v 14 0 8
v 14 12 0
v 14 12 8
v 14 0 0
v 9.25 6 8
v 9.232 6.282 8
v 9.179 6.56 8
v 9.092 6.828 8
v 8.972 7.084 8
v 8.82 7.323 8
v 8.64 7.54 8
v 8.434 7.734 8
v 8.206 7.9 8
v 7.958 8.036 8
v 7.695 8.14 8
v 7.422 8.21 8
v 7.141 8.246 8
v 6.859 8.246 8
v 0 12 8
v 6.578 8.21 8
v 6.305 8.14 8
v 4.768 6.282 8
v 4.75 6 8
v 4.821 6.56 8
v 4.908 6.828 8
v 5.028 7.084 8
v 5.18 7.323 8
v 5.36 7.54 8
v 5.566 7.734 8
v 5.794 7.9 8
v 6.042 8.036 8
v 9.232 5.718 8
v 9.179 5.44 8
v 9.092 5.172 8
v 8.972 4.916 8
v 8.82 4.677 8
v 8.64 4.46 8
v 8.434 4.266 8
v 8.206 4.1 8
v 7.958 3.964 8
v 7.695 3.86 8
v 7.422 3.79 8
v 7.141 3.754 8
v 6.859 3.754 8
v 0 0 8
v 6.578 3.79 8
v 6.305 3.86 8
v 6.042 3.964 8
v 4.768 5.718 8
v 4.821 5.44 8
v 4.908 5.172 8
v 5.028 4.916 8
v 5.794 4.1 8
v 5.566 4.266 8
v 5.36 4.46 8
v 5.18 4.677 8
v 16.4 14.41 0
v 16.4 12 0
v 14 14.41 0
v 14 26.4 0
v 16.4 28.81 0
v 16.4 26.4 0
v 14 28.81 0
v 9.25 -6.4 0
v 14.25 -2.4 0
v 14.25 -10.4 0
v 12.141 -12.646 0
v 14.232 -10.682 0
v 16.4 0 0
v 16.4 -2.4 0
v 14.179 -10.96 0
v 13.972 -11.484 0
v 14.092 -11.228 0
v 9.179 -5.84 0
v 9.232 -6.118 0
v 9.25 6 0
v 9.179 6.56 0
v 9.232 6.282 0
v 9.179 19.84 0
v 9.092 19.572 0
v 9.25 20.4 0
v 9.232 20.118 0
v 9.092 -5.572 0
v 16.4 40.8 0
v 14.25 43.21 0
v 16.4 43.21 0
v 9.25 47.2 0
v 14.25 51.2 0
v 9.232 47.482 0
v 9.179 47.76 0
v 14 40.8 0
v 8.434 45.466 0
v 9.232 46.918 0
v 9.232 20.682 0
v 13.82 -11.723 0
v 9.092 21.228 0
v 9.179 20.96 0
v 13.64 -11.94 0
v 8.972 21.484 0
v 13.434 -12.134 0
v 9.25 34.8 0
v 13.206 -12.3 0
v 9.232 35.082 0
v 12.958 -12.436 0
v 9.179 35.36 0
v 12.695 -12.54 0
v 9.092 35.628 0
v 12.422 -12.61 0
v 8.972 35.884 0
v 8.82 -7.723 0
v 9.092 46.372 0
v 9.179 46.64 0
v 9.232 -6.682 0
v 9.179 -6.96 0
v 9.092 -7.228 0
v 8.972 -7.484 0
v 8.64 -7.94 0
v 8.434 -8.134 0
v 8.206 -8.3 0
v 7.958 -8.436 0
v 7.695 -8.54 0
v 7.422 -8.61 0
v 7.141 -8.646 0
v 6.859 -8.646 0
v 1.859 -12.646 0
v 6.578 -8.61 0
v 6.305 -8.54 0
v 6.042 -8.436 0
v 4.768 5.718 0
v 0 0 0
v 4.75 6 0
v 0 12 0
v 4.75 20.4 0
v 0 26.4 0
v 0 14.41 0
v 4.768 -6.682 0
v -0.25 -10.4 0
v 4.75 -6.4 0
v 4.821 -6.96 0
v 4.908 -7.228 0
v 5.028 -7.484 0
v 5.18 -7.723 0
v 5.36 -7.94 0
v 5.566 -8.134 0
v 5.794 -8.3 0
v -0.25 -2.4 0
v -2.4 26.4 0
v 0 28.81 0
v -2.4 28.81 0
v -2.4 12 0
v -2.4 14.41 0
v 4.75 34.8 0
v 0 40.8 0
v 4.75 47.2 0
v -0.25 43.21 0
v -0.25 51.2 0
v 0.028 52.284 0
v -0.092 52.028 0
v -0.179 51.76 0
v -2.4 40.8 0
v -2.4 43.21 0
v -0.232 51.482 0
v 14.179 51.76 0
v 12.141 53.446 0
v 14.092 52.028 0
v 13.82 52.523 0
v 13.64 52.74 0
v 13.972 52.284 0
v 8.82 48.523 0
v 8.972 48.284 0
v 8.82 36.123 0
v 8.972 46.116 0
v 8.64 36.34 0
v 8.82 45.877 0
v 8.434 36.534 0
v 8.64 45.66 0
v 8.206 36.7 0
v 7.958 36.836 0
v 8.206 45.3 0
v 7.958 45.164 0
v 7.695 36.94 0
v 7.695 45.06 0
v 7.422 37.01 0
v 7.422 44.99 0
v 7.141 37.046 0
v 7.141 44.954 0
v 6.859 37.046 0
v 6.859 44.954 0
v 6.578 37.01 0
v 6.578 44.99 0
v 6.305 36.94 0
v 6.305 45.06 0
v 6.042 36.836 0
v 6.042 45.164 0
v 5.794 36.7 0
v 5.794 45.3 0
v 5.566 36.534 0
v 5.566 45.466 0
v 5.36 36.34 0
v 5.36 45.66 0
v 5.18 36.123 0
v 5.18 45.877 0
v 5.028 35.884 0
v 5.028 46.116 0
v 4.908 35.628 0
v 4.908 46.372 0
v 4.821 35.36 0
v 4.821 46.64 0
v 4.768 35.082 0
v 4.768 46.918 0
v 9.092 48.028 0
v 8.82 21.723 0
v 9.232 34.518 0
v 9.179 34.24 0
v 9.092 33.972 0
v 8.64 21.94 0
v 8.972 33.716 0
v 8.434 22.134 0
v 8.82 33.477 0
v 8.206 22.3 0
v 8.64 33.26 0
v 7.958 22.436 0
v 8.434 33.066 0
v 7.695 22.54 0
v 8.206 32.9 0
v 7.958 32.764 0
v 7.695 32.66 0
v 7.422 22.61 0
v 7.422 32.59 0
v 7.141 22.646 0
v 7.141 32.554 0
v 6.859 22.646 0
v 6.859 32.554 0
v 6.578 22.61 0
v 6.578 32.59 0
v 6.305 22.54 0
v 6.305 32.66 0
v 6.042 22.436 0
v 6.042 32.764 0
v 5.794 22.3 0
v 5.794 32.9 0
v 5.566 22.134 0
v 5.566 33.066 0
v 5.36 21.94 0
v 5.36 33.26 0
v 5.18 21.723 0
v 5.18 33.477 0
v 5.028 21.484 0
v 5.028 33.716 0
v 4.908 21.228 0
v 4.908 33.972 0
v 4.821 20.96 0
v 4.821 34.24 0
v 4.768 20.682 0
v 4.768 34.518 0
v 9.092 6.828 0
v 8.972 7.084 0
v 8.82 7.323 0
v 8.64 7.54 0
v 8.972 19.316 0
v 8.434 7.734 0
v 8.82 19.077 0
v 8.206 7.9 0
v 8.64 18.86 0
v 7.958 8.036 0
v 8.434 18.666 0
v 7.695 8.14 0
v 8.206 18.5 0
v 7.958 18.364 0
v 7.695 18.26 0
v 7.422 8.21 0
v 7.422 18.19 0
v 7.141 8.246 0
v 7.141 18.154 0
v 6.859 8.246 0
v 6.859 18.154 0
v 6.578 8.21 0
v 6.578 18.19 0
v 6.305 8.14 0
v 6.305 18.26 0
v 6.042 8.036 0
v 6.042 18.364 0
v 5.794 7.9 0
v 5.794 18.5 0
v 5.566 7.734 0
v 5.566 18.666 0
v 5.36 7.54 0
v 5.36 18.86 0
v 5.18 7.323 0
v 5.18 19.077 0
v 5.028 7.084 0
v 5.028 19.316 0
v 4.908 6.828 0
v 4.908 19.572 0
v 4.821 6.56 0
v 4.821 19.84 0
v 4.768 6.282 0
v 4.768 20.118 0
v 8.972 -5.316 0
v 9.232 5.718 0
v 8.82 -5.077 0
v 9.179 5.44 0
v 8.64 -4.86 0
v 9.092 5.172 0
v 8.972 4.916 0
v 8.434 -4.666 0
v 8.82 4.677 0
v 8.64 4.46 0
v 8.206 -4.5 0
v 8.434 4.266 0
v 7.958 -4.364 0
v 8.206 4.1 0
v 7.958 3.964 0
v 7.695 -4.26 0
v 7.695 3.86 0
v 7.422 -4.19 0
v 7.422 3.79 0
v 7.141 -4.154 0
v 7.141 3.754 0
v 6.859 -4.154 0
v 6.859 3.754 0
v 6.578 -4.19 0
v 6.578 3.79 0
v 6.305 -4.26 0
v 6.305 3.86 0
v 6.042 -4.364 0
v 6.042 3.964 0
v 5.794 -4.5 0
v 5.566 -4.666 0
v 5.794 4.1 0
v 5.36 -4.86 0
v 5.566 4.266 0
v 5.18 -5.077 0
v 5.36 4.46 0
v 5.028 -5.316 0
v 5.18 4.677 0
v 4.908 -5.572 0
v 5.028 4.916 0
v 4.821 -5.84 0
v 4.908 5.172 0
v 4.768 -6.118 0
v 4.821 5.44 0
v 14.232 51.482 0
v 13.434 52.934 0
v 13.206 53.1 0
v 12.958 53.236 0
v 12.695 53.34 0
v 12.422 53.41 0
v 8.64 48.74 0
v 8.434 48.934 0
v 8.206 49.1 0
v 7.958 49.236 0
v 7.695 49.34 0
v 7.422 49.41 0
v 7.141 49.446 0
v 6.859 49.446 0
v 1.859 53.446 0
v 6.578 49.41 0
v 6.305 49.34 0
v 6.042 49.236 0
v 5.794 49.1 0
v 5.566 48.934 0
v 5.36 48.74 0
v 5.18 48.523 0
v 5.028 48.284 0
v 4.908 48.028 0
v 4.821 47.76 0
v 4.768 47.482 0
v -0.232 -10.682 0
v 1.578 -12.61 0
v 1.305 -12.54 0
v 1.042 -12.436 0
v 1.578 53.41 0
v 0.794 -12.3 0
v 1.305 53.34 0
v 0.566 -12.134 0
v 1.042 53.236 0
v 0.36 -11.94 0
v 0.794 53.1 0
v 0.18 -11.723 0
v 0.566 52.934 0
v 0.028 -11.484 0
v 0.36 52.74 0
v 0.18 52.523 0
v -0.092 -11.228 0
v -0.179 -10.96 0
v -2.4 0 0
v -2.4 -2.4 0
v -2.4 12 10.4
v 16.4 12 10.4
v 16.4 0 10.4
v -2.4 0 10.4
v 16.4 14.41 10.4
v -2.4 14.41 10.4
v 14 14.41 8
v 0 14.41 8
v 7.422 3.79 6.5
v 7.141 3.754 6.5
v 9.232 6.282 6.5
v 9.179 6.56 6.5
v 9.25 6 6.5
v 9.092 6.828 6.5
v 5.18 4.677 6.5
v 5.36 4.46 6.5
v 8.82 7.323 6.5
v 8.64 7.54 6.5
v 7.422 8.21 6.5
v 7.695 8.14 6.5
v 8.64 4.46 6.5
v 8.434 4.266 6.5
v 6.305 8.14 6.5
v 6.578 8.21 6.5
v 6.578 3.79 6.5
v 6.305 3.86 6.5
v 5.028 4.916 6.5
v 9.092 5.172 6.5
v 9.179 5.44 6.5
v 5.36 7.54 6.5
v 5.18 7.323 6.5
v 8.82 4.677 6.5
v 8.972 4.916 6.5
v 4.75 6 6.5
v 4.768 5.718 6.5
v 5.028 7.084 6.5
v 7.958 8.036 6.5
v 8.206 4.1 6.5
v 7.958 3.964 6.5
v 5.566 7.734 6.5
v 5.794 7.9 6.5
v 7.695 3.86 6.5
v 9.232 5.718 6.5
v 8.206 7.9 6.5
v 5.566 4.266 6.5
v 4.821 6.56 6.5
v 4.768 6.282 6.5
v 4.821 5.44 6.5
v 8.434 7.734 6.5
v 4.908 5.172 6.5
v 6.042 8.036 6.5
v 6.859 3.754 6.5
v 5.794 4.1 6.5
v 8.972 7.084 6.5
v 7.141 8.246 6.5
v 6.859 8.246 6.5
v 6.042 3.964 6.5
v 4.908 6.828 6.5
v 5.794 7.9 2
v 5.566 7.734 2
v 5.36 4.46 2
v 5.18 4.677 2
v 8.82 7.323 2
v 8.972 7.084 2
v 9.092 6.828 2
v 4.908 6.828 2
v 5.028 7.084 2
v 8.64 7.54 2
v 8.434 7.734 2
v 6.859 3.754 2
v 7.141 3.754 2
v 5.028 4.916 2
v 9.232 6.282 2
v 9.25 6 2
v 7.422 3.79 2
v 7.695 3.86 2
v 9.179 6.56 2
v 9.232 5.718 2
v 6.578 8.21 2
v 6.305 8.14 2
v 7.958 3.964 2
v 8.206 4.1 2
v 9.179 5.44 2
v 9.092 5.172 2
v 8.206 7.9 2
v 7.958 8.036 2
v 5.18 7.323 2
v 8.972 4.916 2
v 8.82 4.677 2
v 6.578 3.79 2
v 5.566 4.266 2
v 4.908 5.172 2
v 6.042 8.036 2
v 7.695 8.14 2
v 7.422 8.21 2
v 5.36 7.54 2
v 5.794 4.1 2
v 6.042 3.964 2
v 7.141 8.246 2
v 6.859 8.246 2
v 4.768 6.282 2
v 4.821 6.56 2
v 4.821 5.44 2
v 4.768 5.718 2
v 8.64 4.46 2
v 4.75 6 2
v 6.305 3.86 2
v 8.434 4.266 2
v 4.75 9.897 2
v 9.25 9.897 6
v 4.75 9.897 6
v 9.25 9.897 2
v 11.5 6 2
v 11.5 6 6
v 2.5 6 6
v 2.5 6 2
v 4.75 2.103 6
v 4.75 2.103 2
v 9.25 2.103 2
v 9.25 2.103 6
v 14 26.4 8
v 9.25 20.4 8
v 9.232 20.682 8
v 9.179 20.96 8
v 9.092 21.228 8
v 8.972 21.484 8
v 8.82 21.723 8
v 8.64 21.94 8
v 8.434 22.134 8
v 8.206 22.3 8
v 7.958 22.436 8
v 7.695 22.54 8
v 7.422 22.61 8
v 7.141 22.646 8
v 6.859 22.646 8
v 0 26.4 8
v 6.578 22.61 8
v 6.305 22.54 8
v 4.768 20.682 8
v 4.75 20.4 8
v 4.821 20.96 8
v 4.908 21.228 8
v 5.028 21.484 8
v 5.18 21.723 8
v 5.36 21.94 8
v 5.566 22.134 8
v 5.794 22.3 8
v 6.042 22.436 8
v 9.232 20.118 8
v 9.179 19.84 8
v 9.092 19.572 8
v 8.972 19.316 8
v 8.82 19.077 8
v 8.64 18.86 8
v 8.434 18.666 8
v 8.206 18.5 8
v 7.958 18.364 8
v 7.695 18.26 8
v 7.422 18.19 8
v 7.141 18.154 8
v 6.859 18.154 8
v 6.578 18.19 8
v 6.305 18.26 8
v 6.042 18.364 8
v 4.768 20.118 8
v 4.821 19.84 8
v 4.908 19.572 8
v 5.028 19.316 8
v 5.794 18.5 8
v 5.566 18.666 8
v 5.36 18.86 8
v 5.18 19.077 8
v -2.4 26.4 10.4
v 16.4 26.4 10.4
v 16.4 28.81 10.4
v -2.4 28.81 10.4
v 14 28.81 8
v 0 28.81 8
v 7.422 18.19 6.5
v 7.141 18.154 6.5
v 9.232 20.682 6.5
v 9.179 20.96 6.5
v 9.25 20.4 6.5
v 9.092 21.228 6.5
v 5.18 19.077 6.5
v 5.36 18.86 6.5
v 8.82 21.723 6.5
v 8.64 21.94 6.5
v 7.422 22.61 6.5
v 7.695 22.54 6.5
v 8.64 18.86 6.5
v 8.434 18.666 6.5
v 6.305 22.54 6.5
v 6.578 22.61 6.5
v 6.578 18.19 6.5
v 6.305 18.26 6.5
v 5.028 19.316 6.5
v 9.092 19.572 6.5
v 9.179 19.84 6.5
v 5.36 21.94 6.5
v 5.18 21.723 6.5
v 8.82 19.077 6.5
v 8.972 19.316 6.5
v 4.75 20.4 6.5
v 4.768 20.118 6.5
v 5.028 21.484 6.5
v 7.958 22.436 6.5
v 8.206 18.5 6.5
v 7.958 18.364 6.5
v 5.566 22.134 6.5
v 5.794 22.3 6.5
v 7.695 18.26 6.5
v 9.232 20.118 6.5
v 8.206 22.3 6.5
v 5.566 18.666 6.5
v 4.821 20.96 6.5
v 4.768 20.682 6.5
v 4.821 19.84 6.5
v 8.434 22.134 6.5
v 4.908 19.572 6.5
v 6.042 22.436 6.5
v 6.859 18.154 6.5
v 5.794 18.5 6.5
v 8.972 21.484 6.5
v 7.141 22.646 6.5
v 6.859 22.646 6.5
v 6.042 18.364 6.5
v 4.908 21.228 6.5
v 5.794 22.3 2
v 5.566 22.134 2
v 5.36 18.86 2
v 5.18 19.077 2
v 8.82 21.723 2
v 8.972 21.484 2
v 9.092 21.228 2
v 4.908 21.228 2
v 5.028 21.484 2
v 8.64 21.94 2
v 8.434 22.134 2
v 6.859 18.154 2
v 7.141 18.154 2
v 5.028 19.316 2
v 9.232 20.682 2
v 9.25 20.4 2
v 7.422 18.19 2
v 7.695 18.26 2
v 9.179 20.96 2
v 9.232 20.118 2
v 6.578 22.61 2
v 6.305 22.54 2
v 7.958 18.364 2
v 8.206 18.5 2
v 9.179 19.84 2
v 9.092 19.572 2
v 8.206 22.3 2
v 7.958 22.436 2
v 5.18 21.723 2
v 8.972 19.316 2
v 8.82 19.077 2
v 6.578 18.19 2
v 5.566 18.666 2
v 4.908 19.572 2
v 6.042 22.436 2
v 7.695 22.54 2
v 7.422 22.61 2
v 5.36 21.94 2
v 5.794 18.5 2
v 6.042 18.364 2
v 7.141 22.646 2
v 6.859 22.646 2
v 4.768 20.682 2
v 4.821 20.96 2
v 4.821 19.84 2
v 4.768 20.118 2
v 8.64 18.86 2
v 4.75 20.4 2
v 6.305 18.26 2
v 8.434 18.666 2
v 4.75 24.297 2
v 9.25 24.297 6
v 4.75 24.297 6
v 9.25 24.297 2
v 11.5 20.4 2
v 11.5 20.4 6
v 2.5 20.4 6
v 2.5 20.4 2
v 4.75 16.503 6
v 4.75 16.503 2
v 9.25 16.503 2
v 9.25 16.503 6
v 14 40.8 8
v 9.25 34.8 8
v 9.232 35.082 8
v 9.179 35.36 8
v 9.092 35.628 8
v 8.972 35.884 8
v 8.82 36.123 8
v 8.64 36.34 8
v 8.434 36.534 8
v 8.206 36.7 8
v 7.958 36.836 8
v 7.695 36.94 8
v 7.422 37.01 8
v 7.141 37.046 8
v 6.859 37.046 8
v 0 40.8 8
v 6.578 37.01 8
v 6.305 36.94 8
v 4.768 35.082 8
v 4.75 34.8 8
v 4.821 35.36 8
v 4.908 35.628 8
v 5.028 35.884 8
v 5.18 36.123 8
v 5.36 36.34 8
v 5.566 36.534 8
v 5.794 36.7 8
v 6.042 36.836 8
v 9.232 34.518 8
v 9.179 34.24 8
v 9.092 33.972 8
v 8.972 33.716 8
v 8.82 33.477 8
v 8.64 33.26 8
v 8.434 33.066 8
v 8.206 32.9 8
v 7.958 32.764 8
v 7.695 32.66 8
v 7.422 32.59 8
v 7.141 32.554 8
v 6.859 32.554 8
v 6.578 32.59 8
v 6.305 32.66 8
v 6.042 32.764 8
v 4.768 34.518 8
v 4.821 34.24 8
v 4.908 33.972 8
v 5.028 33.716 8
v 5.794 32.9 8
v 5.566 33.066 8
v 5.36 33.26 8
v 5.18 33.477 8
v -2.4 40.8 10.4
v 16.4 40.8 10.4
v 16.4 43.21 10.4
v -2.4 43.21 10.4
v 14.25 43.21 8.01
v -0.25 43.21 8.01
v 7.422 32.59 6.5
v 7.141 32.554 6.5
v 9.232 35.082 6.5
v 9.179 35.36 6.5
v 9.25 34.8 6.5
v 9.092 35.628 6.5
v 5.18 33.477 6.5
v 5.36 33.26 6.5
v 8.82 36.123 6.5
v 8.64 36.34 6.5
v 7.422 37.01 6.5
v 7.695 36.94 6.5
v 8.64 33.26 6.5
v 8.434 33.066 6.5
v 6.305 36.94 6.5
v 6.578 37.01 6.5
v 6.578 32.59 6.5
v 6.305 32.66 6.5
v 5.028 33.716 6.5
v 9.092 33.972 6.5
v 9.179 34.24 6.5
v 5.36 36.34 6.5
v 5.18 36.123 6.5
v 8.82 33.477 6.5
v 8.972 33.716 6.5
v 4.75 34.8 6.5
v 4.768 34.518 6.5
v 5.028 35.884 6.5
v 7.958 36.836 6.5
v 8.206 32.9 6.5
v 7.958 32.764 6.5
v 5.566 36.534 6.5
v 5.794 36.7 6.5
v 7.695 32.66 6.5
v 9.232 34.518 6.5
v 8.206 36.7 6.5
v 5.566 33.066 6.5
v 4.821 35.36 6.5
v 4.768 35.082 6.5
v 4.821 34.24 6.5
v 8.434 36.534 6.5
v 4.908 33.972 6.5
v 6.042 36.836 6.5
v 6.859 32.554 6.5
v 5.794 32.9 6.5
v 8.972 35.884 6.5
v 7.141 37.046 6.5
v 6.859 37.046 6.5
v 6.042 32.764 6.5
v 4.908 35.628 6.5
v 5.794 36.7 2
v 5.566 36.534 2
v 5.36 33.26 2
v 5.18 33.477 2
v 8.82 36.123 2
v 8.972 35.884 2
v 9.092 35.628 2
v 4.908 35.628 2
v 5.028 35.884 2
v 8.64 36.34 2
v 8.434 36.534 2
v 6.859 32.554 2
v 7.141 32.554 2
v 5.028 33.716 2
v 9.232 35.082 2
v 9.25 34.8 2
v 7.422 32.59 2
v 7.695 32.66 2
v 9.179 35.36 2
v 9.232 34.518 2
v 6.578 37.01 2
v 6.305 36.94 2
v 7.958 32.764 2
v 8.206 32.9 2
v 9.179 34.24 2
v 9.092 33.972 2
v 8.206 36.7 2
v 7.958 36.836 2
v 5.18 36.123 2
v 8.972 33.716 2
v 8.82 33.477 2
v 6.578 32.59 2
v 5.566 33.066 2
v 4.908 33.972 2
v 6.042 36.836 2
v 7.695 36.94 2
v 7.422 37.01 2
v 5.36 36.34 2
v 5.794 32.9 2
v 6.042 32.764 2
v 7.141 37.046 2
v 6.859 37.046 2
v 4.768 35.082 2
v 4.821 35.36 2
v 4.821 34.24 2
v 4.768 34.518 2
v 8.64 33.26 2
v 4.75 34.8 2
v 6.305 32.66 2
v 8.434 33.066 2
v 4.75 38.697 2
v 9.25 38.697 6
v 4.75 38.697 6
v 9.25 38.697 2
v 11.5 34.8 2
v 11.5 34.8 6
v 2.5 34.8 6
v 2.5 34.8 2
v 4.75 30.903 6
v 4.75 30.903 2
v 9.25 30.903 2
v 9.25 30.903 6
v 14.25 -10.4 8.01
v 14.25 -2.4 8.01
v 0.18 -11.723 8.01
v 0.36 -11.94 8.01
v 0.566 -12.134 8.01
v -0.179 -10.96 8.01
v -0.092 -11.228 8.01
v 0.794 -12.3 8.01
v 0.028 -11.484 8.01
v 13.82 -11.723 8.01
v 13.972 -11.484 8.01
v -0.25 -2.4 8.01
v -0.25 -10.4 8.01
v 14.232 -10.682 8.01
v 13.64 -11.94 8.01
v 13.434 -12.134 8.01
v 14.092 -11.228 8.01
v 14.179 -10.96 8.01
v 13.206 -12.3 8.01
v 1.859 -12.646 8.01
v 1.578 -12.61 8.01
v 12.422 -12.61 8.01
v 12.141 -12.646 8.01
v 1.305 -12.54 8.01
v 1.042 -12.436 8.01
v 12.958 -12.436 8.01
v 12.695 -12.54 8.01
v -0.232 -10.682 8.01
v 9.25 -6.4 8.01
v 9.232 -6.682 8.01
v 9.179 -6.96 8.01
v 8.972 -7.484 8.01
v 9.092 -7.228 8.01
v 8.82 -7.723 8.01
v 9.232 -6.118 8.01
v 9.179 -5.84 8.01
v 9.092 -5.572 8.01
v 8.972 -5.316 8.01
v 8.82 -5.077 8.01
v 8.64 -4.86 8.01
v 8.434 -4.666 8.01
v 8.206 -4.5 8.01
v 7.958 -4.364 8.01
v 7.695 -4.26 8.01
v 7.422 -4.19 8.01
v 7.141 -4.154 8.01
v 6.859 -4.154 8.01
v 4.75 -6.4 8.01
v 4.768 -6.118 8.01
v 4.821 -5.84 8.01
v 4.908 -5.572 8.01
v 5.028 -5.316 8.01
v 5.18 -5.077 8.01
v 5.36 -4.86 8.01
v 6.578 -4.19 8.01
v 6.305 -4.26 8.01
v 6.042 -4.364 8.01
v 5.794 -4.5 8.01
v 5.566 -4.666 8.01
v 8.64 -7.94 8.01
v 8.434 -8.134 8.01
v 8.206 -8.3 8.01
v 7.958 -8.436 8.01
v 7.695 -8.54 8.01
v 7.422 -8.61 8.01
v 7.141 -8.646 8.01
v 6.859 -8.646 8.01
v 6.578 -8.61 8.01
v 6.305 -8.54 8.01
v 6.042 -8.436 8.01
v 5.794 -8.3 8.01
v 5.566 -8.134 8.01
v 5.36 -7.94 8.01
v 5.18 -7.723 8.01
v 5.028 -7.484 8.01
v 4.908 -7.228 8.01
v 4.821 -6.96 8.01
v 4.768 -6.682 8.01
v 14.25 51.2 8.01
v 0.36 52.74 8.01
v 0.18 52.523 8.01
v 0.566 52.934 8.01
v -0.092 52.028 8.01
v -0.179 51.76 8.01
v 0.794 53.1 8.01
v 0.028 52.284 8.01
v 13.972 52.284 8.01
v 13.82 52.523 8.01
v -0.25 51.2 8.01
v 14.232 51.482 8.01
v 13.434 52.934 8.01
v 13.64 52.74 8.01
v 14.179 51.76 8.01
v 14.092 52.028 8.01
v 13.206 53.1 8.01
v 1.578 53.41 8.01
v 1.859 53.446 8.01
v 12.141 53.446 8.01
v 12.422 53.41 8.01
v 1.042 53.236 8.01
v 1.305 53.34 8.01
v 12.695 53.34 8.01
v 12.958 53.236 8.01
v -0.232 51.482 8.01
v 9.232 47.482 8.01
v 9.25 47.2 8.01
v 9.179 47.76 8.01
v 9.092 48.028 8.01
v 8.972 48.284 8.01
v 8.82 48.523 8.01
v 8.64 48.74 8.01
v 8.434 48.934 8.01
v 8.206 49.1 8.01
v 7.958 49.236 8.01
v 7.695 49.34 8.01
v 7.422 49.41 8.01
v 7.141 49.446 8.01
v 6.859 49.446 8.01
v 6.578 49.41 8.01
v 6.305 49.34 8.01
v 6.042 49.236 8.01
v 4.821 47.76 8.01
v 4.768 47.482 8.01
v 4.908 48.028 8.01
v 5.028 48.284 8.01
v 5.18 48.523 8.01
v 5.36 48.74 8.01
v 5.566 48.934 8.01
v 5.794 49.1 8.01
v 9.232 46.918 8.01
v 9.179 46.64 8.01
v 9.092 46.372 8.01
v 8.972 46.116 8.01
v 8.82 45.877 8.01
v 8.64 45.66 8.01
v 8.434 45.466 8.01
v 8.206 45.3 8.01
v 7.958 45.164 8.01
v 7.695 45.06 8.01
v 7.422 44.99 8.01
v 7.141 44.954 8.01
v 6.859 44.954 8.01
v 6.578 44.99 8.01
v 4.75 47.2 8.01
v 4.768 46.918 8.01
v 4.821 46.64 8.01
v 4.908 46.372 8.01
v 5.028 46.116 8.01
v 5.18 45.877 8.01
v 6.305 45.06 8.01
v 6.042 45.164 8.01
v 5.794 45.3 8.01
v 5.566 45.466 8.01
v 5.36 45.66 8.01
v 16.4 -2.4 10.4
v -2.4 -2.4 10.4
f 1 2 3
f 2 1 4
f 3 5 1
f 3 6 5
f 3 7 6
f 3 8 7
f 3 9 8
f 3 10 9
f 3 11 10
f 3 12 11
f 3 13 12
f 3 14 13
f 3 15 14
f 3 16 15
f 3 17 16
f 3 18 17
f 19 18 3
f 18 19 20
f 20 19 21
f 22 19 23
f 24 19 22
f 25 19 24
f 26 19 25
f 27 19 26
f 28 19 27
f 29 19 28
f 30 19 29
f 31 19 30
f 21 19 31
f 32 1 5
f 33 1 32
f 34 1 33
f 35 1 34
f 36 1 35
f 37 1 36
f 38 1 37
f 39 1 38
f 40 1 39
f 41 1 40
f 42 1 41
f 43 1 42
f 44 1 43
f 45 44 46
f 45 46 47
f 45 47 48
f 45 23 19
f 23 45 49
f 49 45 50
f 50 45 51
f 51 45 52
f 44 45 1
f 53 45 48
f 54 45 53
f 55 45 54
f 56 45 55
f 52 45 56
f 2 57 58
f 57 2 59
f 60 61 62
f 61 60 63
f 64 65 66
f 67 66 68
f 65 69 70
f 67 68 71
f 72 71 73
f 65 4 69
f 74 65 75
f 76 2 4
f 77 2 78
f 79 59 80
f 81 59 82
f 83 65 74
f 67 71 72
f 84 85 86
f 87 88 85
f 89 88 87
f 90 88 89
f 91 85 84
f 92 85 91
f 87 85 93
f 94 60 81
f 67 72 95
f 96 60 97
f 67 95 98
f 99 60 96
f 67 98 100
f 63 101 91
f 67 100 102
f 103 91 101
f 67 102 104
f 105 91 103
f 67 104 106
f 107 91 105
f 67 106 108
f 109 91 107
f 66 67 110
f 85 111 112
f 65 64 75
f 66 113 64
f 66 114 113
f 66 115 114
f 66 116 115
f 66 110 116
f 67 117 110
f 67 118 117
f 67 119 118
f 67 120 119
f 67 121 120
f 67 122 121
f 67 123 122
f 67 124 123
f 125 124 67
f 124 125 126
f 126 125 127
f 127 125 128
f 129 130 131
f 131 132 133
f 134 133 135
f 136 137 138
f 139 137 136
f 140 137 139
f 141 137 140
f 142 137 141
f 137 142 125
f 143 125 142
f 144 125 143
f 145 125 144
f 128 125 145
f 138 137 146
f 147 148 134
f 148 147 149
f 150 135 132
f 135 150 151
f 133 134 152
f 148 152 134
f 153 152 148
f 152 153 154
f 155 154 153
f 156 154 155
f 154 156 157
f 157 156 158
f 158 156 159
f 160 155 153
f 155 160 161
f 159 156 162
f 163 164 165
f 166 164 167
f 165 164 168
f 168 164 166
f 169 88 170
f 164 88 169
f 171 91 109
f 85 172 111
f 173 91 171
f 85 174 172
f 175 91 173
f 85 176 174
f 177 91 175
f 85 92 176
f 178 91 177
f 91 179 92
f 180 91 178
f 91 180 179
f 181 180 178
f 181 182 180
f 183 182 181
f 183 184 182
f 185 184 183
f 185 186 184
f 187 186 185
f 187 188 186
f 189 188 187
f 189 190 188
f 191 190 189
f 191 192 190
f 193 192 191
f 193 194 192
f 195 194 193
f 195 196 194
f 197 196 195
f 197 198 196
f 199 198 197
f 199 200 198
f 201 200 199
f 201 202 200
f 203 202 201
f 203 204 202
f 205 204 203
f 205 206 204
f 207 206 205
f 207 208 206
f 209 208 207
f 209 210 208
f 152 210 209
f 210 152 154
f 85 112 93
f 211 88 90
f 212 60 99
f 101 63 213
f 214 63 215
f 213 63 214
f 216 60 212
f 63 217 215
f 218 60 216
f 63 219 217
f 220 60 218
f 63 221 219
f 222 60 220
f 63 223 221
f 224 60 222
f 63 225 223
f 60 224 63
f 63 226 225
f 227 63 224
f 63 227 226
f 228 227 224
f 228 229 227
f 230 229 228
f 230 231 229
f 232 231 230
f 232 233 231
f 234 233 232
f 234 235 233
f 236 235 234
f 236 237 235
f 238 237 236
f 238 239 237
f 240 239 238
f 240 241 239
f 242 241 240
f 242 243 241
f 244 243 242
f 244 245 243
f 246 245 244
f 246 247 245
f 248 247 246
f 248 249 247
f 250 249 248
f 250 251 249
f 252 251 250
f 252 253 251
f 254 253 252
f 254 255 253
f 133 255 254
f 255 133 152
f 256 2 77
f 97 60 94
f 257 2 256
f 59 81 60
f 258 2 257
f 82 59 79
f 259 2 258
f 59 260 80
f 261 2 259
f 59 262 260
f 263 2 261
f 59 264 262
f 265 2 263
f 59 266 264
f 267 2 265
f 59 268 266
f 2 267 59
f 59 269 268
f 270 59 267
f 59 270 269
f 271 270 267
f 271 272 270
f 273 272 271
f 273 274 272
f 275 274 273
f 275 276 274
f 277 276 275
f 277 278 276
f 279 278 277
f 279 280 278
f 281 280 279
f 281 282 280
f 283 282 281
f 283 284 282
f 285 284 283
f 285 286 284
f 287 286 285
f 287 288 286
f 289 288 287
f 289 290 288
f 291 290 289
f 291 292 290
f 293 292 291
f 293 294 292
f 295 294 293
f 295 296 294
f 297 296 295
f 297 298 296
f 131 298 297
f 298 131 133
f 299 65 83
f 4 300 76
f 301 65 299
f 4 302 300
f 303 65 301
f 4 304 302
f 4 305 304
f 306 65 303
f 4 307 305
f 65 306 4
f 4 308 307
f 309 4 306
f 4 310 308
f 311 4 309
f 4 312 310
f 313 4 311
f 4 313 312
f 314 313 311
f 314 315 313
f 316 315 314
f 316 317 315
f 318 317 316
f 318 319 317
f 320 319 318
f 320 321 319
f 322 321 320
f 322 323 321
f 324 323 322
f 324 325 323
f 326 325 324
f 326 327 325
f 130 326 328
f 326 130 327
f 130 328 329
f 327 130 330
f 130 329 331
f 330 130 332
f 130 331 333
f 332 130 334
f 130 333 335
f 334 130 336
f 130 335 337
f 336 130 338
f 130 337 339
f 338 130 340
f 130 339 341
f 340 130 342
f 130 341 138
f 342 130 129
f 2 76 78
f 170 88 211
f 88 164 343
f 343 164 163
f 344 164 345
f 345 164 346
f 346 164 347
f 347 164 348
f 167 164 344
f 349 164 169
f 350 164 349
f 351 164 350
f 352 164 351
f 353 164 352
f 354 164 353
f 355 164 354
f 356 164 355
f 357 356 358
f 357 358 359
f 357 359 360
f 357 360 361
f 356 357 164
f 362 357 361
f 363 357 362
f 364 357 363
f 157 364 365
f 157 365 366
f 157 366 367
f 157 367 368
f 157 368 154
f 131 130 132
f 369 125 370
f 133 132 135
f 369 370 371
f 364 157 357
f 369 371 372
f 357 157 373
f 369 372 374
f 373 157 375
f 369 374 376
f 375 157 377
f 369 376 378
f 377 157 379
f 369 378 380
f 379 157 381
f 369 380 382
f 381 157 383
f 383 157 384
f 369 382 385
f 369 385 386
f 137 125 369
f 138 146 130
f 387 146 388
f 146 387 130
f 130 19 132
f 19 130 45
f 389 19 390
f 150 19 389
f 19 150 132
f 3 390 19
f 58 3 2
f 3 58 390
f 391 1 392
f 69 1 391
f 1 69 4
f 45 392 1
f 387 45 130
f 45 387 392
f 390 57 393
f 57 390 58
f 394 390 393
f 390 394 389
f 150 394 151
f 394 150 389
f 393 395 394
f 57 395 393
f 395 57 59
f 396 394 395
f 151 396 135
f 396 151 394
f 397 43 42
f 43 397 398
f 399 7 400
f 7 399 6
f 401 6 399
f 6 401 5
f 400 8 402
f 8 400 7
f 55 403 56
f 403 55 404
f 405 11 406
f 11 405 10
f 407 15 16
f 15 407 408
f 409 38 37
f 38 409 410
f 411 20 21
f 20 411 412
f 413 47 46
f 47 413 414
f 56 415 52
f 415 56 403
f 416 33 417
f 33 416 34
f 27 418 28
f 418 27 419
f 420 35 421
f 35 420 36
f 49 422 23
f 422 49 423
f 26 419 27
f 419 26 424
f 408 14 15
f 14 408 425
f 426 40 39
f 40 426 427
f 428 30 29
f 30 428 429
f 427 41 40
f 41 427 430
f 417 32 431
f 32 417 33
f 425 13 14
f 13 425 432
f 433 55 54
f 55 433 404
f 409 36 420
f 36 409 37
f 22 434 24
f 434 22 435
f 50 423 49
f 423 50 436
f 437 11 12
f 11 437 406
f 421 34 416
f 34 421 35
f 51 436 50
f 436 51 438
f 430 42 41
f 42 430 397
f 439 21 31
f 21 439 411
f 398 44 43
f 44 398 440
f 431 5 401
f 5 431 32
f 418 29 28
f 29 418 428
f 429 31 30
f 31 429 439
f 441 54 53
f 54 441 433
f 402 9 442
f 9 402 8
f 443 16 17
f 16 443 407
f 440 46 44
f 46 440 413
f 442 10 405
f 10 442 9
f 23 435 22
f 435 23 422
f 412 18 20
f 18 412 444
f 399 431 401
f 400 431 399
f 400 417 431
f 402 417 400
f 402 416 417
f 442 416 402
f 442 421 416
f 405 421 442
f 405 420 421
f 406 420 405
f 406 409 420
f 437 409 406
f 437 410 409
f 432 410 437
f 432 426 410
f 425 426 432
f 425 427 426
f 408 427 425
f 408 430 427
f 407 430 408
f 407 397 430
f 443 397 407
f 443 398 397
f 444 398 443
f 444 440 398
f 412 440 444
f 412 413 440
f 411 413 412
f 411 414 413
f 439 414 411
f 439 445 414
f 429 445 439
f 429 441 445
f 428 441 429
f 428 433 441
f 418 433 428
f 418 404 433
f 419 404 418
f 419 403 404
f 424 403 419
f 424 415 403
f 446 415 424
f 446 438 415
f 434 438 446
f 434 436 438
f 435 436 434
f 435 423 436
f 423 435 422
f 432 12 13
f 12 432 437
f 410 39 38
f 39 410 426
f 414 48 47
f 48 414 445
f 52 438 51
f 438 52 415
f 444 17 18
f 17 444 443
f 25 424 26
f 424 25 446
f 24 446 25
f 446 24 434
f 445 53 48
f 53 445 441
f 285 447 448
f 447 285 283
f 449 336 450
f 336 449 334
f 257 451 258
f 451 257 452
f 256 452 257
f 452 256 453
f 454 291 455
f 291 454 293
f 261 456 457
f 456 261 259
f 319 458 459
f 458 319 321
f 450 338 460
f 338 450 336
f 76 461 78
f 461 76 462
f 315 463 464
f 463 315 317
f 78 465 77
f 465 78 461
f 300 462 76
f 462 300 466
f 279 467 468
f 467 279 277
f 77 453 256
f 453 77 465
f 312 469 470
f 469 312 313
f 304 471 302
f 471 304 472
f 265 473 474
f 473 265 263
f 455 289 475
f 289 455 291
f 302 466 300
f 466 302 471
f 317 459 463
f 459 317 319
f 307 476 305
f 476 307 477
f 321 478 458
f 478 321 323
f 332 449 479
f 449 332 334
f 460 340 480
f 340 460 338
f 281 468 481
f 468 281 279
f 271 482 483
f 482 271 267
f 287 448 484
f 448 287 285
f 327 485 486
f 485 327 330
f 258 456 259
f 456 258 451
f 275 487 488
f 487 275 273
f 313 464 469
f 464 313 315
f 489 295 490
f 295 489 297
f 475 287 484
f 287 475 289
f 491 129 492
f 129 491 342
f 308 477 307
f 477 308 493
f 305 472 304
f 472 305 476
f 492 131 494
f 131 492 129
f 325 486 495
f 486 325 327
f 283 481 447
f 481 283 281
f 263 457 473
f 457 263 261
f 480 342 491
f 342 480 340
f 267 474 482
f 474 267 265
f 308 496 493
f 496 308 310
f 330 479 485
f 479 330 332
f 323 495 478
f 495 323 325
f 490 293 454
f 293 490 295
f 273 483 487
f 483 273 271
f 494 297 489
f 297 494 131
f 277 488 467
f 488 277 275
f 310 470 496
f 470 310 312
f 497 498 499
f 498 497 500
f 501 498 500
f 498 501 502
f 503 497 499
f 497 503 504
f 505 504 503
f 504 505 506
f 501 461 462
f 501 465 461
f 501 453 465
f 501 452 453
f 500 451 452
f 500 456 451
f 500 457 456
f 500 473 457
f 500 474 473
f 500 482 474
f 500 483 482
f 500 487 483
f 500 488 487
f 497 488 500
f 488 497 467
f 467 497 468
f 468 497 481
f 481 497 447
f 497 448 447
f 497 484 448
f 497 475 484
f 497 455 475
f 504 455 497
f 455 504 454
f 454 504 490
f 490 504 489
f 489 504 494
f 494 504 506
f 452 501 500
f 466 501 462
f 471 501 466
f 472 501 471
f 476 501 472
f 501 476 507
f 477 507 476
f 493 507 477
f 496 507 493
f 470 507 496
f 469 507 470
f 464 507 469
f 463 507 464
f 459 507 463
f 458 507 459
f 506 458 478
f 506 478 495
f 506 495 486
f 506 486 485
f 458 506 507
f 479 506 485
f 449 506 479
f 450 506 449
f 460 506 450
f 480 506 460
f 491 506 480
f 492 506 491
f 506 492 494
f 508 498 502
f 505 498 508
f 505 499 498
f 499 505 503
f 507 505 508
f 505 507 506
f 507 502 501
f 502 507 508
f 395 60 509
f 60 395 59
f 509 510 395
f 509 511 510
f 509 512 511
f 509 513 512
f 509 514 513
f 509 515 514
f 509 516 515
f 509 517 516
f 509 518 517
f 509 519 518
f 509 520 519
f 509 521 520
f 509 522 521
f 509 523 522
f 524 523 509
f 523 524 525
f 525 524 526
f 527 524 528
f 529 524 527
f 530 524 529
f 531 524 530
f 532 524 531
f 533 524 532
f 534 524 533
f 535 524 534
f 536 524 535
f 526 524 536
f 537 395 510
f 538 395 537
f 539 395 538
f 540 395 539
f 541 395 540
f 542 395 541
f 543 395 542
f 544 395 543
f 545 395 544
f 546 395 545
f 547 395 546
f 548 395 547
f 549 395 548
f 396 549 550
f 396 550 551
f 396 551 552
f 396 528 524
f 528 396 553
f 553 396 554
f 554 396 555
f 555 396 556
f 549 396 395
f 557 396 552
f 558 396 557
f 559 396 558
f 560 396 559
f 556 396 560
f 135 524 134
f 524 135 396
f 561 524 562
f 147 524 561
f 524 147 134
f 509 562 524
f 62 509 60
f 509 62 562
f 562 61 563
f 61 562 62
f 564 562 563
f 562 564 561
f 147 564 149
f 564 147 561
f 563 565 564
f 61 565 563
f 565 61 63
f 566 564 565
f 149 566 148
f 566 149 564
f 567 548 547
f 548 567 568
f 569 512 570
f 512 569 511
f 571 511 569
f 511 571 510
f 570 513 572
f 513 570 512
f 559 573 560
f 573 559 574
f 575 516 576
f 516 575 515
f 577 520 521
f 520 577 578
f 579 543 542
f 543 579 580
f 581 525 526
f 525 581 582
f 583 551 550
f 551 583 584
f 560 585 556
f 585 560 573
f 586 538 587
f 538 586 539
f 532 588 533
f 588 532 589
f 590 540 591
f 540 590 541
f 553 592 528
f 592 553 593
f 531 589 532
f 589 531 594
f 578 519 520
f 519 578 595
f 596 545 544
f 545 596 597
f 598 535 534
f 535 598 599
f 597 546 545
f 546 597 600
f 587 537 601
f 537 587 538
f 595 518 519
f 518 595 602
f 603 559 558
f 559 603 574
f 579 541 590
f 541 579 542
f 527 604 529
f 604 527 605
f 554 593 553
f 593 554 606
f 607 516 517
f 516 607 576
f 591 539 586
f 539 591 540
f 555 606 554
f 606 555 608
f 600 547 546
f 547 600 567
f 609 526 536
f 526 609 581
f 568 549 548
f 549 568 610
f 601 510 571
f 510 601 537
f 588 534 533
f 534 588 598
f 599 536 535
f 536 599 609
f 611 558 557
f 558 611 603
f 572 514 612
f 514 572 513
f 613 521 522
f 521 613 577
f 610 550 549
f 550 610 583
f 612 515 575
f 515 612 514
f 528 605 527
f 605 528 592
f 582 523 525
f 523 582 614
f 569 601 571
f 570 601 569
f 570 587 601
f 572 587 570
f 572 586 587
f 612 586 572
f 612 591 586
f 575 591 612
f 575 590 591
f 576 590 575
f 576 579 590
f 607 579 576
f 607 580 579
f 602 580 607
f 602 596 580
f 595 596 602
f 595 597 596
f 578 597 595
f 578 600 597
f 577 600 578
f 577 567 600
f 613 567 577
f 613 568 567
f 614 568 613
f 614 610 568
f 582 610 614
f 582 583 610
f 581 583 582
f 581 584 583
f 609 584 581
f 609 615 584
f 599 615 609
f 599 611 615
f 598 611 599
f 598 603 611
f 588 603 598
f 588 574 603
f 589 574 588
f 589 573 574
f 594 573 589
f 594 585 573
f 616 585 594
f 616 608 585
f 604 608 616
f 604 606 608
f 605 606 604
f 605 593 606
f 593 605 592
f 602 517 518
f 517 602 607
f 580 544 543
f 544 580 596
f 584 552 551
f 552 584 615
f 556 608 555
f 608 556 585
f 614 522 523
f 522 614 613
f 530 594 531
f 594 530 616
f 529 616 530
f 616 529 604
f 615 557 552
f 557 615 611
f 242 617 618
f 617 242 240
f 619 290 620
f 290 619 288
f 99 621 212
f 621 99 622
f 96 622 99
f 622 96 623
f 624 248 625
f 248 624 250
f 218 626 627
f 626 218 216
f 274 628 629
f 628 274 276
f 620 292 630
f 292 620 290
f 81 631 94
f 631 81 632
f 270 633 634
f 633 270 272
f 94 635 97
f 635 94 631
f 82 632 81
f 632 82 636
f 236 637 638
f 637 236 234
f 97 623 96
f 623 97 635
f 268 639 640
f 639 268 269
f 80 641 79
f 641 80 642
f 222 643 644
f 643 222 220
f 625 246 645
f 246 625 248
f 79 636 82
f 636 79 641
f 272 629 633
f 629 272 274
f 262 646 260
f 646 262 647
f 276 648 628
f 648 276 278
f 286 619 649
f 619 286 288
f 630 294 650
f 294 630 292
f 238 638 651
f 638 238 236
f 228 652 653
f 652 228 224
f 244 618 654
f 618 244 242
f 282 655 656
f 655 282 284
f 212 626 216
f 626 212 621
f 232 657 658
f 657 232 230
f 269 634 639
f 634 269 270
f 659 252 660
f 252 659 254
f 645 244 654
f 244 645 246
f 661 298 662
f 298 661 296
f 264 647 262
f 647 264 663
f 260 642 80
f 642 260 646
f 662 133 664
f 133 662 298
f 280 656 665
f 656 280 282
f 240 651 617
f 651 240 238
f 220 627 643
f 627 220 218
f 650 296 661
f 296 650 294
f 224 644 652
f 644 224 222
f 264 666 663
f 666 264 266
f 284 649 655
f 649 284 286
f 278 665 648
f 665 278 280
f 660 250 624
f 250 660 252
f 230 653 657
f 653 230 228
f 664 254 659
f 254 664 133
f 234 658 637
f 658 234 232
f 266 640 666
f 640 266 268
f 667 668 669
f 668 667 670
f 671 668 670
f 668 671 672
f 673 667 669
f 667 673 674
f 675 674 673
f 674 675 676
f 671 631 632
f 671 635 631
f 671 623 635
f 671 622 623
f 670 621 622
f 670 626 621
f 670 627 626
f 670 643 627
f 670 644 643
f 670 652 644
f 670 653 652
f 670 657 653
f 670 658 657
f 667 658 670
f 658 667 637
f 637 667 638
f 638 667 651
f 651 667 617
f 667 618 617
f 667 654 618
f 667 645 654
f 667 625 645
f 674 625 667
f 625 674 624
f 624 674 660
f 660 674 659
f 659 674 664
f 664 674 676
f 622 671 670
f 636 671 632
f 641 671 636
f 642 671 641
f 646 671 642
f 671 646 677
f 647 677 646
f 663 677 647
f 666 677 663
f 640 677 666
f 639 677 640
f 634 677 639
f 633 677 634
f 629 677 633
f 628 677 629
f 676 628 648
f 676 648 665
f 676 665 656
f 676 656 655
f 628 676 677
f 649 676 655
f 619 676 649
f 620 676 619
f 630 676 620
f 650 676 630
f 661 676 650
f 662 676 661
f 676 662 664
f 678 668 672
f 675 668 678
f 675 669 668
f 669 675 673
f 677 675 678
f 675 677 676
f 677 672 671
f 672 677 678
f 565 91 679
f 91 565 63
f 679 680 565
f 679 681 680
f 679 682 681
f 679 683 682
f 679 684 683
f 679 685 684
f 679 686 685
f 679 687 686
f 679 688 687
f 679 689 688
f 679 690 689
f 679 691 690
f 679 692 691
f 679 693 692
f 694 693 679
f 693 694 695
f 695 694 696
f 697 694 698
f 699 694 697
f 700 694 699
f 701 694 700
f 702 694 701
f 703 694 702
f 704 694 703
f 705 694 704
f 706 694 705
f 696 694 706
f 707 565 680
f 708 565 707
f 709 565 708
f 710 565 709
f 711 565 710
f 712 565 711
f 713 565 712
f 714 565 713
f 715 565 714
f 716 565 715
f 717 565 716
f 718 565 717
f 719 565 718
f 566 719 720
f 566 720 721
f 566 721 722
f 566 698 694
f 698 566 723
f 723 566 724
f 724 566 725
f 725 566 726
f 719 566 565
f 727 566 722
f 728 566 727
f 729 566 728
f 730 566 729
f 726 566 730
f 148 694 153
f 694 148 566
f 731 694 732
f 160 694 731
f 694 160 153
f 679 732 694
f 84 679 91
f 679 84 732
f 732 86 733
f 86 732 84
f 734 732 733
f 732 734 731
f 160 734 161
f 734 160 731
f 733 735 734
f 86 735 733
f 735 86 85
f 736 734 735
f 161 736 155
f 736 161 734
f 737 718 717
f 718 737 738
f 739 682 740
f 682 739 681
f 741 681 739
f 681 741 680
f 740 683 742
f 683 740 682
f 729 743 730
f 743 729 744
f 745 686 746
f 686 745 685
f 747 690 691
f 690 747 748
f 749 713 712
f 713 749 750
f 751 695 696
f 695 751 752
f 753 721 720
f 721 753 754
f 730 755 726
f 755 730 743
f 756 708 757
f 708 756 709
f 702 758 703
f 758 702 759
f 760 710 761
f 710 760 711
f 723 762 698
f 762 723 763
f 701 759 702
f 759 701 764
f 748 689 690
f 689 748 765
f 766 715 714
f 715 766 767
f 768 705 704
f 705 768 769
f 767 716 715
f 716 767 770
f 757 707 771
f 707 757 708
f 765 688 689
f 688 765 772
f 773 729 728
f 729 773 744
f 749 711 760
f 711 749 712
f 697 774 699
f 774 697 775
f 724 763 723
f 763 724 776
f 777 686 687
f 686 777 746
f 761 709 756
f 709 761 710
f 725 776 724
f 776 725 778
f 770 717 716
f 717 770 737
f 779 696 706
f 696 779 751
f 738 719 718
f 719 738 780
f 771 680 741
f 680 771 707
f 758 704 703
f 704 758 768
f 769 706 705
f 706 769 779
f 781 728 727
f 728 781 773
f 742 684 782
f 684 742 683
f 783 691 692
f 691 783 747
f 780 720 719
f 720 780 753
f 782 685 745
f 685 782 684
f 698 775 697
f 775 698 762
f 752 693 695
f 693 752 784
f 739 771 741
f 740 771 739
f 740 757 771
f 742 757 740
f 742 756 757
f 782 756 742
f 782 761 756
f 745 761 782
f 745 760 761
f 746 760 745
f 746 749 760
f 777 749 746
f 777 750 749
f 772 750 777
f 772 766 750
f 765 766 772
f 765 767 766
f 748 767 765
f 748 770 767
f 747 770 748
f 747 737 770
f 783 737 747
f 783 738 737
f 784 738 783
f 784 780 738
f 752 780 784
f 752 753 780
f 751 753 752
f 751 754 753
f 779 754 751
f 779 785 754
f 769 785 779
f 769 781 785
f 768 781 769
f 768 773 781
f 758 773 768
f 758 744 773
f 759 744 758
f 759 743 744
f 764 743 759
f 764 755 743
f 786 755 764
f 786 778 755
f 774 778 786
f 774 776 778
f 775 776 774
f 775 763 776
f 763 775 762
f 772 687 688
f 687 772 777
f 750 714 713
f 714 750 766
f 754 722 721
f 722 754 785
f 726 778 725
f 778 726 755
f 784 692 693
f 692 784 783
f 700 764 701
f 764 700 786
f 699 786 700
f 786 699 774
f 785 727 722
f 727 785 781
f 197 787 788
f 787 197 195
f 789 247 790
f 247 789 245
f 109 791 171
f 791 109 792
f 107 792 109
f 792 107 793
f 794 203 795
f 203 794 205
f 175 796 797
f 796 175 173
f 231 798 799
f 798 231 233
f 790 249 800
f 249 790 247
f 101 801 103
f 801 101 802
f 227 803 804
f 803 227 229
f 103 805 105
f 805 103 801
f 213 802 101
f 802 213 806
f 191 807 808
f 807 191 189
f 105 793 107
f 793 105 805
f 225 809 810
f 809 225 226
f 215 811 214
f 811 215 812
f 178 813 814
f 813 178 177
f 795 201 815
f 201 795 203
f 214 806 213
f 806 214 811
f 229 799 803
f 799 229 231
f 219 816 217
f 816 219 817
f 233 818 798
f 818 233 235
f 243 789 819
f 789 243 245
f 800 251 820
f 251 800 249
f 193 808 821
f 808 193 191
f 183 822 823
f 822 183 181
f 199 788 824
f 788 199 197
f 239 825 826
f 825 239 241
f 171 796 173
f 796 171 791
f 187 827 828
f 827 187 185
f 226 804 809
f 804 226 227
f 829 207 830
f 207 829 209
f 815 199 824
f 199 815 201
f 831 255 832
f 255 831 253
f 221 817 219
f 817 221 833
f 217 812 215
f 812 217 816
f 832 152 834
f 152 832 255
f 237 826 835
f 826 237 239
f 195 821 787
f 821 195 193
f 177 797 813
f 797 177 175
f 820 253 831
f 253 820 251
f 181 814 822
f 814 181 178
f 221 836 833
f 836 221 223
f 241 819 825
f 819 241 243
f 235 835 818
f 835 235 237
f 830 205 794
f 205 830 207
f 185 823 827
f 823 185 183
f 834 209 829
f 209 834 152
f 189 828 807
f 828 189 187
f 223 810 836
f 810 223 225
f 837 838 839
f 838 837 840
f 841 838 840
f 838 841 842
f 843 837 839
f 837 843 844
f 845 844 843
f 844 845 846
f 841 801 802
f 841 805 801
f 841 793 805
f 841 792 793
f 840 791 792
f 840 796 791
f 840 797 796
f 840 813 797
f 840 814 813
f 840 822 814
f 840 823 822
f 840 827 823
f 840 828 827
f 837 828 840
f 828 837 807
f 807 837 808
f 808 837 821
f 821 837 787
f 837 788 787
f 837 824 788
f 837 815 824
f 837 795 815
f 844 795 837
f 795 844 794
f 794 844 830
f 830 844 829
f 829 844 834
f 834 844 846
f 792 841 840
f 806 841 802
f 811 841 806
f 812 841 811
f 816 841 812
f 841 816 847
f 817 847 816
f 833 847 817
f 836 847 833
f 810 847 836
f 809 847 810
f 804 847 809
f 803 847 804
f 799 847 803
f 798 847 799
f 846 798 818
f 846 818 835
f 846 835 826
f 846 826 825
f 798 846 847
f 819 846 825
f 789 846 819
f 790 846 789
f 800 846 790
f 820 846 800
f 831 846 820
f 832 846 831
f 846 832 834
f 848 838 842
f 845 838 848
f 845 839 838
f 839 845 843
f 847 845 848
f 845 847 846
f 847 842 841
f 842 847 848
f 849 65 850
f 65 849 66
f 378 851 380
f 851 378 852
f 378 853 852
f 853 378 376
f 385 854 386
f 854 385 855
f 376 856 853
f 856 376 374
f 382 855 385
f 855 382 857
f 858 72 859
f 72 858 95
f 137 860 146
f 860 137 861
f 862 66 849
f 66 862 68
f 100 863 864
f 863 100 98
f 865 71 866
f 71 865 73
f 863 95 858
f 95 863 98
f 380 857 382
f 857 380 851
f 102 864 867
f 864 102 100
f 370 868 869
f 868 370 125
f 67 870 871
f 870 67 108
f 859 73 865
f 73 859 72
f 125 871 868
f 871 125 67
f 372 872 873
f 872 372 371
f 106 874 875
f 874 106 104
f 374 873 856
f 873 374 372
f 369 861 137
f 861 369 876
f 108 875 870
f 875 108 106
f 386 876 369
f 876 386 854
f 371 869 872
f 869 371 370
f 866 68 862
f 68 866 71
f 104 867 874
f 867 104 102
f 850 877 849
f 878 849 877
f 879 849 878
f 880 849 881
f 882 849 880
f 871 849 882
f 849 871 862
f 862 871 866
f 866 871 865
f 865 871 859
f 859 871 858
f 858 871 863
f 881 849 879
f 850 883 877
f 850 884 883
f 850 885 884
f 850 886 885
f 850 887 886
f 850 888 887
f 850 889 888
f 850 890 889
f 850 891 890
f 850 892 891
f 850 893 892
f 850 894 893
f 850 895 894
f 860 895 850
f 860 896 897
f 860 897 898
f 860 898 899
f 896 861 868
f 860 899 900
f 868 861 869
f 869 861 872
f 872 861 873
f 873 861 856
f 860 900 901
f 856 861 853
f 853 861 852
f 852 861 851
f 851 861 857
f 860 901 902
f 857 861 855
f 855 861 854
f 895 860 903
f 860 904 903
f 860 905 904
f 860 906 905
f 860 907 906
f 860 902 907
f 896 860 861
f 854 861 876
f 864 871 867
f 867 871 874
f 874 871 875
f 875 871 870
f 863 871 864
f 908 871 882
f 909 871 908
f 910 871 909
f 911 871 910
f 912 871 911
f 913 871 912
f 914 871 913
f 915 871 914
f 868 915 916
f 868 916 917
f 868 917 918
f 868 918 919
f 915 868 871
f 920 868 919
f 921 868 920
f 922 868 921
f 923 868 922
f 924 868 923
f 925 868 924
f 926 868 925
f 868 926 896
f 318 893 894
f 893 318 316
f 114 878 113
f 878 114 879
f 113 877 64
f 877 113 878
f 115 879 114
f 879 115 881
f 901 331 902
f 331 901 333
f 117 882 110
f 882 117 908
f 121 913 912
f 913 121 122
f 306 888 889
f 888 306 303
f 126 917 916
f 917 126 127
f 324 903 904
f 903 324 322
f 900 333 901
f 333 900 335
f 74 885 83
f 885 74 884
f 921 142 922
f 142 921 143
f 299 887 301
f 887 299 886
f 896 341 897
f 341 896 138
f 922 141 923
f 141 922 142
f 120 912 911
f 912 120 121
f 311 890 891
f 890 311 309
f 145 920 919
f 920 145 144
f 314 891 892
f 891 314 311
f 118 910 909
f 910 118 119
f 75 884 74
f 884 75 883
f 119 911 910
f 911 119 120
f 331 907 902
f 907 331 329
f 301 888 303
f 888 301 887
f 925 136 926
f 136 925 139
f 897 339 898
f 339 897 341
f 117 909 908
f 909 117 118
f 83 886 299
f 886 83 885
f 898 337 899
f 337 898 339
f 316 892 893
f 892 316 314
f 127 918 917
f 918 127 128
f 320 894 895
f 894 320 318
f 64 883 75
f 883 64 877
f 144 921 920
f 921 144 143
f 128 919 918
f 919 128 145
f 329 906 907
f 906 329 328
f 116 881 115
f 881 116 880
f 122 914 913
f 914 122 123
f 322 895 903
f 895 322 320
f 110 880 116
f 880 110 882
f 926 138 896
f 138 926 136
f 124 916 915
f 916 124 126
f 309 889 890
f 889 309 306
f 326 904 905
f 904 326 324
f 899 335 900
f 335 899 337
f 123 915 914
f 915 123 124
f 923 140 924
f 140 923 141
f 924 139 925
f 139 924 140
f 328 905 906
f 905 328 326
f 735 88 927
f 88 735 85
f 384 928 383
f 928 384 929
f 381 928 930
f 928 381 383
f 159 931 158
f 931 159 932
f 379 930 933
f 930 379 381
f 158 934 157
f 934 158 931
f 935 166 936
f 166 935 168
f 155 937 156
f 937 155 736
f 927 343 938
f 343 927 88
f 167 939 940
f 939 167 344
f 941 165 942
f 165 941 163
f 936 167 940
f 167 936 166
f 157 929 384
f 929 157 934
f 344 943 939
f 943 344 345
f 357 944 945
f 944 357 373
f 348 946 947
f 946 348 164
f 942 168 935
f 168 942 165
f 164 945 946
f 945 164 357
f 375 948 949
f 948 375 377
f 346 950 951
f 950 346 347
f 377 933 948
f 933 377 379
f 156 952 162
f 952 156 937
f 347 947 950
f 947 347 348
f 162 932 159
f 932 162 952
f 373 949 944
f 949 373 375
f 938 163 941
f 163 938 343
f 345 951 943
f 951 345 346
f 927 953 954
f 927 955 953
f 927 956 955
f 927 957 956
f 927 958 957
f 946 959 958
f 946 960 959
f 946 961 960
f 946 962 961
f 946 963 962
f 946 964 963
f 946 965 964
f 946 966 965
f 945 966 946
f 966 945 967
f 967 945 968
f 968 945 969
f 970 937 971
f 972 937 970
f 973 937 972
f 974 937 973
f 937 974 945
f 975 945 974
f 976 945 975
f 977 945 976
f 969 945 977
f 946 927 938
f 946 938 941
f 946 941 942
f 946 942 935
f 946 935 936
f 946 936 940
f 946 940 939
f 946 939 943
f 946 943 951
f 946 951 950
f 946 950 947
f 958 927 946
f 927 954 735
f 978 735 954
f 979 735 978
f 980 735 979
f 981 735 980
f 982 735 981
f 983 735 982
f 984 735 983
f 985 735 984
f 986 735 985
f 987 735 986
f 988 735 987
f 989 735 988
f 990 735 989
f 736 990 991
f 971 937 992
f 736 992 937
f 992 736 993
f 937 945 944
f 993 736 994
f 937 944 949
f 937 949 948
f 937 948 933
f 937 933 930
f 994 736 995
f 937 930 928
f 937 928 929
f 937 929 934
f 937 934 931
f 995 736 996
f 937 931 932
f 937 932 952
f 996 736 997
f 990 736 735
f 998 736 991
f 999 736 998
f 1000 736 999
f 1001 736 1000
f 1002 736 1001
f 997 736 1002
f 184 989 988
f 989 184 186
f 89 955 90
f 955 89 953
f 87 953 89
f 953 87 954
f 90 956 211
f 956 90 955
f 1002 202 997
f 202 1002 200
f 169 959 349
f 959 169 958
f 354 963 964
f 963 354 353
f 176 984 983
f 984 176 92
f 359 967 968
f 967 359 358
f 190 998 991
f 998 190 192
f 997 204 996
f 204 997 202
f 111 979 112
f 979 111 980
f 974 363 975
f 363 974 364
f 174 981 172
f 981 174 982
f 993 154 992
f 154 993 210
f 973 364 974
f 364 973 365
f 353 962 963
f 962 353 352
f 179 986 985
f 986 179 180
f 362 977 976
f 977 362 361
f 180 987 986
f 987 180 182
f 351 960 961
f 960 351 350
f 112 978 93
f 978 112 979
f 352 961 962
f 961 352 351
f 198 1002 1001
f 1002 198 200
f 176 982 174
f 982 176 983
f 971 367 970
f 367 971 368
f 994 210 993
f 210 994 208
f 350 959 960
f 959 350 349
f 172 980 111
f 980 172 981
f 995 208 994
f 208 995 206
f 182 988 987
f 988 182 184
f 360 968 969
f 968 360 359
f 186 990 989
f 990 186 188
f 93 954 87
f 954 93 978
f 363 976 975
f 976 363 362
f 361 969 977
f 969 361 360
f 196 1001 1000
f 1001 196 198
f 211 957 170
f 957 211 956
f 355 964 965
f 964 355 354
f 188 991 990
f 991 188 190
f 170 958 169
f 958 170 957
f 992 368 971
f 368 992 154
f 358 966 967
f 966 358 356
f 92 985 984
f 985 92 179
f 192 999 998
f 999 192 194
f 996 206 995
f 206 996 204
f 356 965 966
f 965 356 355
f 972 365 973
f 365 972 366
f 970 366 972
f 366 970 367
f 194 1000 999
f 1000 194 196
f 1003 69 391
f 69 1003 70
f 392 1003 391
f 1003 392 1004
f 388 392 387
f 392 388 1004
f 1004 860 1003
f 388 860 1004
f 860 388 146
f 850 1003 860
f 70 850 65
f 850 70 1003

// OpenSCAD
//
// Terminal Block
//
//

//How many terminals in the block
NoTerminals = 3; // [1,2,3,4,5,6,7,8,9,10,11,12,13,14,15]
// Diameter of screw in terminal
TerminalHoleSize = 4;
//Terminal Height in mm
TerminalHeight = 8;
//Width of each terminal in mm
TerminalWidth = 12;
//Block Width in mm
BlockWidth = 14;
//Terminal Divider width in mm
TerminalDivider = 2.4;
// Nut Thickness
NutThickness = 4;
// Tabs required
ReqTabs = "Yes"; //[Yes,No]
//Mounting tab length
MountTabLength = 8;
//Mounting tab Height
MountTabHeight = 8;
//Mount tab hole diameter in mm
MountHole = 4;
//Clearence
Clearence = 0.5; 
//Are the nuts Enclosed (nuts added during build - print must be paused) or Slotted (nuts added after build) or Bolted that is Hex head bolt inserted post print.
Enclose =1; //[1:Enclosed, 0: Slotted, 2:Bolted]


//Height of the top of the nut above the base
NutHeight = Enclose > 1 ? NutThickness : TerminalHeight - 2;
//echo (NutHeight);


for (i =[ 0:NoTerminals - 1]) {
	translate ([0,(TerminalWidth + TerminalDivider) * i ,0]) 
		terminal() ;
	}

translate ([- TerminalDivider ,- TerminalDivider , 0]) 
		cube([BlockWidth + TerminalDivider * 2,
				TerminalDivider ,
				TerminalHeight + TerminalDivider]);
if (ReqTabs == "Yes") {
	translate ([0,-TerminalDivider,0]) mirror ([0,1,0]) tab() ;
	translate ([0,(TerminalWidth + TerminalDivider) * NoTerminals,0]) tab() ;
	}

module tab() {
	difference () {
		translate ([MountHole /2, 0,0]) 
			minkowski() {
				cube([BlockWidth - MountHole,
					MountTabLength ,
					MountTabHeight ]);
				cylinder ( r= (MountHole + Clearence )/2 , h =.01 , $fn=50);
			}
		translate ([BlockWidth /2, MountTabLength /2, -1]) cylinder ( r= (MountHole + Clearence )/2 , h = MountTabHeight + 2, $fn=50);
	}
}



module terminal() {
difference() {
	union() {
		cube([BlockWidth,TerminalWidth,TerminalHeight]);
		translate ([- TerminalDivider , TerminalWidth , 0]) 
				cube([BlockWidth + (TerminalDivider * 2),
					TerminalDivider + 0.01 ,
					TerminalHeight + TerminalDivider]);
	}
	translate ([BlockWidth / 2,
				TerminalWidth / 2,  
				NutHeight  + .5]) 
			cylinder ( r= (TerminalHoleSize + Clearence )/2 , 
				h = TerminalHeight, $fn=50);

	translate ([BlockWidth /2,
		TerminalWidth /2,  -1]) 
		cylinder ( r= ( TerminalHoleSize + Clearence ) / 2 , 
		h = NutHeight - (NutThickness / 2) + 1, $fn=50);

	translate ([BlockWidth /2,
				TerminalWidth /2,  
				NutHeight - NutThickness ]) 
			cylinder ( r= TerminalHoleSize + ( Clearence ) , h = NutThickness , $fn=6);
	if (Enclose == 0) {
		translate ([BlockWidth /2 + .1,
					(TerminalWidth  - (TerminalHoleSize + Clearence) * 1.8) / 2 ,  
					NutHeight - NutThickness  ]) 
			cube([ BlockWidth /2	, (TerminalHoleSize + Clearence) * 1.8, NutThickness]);
		}
	}
}
